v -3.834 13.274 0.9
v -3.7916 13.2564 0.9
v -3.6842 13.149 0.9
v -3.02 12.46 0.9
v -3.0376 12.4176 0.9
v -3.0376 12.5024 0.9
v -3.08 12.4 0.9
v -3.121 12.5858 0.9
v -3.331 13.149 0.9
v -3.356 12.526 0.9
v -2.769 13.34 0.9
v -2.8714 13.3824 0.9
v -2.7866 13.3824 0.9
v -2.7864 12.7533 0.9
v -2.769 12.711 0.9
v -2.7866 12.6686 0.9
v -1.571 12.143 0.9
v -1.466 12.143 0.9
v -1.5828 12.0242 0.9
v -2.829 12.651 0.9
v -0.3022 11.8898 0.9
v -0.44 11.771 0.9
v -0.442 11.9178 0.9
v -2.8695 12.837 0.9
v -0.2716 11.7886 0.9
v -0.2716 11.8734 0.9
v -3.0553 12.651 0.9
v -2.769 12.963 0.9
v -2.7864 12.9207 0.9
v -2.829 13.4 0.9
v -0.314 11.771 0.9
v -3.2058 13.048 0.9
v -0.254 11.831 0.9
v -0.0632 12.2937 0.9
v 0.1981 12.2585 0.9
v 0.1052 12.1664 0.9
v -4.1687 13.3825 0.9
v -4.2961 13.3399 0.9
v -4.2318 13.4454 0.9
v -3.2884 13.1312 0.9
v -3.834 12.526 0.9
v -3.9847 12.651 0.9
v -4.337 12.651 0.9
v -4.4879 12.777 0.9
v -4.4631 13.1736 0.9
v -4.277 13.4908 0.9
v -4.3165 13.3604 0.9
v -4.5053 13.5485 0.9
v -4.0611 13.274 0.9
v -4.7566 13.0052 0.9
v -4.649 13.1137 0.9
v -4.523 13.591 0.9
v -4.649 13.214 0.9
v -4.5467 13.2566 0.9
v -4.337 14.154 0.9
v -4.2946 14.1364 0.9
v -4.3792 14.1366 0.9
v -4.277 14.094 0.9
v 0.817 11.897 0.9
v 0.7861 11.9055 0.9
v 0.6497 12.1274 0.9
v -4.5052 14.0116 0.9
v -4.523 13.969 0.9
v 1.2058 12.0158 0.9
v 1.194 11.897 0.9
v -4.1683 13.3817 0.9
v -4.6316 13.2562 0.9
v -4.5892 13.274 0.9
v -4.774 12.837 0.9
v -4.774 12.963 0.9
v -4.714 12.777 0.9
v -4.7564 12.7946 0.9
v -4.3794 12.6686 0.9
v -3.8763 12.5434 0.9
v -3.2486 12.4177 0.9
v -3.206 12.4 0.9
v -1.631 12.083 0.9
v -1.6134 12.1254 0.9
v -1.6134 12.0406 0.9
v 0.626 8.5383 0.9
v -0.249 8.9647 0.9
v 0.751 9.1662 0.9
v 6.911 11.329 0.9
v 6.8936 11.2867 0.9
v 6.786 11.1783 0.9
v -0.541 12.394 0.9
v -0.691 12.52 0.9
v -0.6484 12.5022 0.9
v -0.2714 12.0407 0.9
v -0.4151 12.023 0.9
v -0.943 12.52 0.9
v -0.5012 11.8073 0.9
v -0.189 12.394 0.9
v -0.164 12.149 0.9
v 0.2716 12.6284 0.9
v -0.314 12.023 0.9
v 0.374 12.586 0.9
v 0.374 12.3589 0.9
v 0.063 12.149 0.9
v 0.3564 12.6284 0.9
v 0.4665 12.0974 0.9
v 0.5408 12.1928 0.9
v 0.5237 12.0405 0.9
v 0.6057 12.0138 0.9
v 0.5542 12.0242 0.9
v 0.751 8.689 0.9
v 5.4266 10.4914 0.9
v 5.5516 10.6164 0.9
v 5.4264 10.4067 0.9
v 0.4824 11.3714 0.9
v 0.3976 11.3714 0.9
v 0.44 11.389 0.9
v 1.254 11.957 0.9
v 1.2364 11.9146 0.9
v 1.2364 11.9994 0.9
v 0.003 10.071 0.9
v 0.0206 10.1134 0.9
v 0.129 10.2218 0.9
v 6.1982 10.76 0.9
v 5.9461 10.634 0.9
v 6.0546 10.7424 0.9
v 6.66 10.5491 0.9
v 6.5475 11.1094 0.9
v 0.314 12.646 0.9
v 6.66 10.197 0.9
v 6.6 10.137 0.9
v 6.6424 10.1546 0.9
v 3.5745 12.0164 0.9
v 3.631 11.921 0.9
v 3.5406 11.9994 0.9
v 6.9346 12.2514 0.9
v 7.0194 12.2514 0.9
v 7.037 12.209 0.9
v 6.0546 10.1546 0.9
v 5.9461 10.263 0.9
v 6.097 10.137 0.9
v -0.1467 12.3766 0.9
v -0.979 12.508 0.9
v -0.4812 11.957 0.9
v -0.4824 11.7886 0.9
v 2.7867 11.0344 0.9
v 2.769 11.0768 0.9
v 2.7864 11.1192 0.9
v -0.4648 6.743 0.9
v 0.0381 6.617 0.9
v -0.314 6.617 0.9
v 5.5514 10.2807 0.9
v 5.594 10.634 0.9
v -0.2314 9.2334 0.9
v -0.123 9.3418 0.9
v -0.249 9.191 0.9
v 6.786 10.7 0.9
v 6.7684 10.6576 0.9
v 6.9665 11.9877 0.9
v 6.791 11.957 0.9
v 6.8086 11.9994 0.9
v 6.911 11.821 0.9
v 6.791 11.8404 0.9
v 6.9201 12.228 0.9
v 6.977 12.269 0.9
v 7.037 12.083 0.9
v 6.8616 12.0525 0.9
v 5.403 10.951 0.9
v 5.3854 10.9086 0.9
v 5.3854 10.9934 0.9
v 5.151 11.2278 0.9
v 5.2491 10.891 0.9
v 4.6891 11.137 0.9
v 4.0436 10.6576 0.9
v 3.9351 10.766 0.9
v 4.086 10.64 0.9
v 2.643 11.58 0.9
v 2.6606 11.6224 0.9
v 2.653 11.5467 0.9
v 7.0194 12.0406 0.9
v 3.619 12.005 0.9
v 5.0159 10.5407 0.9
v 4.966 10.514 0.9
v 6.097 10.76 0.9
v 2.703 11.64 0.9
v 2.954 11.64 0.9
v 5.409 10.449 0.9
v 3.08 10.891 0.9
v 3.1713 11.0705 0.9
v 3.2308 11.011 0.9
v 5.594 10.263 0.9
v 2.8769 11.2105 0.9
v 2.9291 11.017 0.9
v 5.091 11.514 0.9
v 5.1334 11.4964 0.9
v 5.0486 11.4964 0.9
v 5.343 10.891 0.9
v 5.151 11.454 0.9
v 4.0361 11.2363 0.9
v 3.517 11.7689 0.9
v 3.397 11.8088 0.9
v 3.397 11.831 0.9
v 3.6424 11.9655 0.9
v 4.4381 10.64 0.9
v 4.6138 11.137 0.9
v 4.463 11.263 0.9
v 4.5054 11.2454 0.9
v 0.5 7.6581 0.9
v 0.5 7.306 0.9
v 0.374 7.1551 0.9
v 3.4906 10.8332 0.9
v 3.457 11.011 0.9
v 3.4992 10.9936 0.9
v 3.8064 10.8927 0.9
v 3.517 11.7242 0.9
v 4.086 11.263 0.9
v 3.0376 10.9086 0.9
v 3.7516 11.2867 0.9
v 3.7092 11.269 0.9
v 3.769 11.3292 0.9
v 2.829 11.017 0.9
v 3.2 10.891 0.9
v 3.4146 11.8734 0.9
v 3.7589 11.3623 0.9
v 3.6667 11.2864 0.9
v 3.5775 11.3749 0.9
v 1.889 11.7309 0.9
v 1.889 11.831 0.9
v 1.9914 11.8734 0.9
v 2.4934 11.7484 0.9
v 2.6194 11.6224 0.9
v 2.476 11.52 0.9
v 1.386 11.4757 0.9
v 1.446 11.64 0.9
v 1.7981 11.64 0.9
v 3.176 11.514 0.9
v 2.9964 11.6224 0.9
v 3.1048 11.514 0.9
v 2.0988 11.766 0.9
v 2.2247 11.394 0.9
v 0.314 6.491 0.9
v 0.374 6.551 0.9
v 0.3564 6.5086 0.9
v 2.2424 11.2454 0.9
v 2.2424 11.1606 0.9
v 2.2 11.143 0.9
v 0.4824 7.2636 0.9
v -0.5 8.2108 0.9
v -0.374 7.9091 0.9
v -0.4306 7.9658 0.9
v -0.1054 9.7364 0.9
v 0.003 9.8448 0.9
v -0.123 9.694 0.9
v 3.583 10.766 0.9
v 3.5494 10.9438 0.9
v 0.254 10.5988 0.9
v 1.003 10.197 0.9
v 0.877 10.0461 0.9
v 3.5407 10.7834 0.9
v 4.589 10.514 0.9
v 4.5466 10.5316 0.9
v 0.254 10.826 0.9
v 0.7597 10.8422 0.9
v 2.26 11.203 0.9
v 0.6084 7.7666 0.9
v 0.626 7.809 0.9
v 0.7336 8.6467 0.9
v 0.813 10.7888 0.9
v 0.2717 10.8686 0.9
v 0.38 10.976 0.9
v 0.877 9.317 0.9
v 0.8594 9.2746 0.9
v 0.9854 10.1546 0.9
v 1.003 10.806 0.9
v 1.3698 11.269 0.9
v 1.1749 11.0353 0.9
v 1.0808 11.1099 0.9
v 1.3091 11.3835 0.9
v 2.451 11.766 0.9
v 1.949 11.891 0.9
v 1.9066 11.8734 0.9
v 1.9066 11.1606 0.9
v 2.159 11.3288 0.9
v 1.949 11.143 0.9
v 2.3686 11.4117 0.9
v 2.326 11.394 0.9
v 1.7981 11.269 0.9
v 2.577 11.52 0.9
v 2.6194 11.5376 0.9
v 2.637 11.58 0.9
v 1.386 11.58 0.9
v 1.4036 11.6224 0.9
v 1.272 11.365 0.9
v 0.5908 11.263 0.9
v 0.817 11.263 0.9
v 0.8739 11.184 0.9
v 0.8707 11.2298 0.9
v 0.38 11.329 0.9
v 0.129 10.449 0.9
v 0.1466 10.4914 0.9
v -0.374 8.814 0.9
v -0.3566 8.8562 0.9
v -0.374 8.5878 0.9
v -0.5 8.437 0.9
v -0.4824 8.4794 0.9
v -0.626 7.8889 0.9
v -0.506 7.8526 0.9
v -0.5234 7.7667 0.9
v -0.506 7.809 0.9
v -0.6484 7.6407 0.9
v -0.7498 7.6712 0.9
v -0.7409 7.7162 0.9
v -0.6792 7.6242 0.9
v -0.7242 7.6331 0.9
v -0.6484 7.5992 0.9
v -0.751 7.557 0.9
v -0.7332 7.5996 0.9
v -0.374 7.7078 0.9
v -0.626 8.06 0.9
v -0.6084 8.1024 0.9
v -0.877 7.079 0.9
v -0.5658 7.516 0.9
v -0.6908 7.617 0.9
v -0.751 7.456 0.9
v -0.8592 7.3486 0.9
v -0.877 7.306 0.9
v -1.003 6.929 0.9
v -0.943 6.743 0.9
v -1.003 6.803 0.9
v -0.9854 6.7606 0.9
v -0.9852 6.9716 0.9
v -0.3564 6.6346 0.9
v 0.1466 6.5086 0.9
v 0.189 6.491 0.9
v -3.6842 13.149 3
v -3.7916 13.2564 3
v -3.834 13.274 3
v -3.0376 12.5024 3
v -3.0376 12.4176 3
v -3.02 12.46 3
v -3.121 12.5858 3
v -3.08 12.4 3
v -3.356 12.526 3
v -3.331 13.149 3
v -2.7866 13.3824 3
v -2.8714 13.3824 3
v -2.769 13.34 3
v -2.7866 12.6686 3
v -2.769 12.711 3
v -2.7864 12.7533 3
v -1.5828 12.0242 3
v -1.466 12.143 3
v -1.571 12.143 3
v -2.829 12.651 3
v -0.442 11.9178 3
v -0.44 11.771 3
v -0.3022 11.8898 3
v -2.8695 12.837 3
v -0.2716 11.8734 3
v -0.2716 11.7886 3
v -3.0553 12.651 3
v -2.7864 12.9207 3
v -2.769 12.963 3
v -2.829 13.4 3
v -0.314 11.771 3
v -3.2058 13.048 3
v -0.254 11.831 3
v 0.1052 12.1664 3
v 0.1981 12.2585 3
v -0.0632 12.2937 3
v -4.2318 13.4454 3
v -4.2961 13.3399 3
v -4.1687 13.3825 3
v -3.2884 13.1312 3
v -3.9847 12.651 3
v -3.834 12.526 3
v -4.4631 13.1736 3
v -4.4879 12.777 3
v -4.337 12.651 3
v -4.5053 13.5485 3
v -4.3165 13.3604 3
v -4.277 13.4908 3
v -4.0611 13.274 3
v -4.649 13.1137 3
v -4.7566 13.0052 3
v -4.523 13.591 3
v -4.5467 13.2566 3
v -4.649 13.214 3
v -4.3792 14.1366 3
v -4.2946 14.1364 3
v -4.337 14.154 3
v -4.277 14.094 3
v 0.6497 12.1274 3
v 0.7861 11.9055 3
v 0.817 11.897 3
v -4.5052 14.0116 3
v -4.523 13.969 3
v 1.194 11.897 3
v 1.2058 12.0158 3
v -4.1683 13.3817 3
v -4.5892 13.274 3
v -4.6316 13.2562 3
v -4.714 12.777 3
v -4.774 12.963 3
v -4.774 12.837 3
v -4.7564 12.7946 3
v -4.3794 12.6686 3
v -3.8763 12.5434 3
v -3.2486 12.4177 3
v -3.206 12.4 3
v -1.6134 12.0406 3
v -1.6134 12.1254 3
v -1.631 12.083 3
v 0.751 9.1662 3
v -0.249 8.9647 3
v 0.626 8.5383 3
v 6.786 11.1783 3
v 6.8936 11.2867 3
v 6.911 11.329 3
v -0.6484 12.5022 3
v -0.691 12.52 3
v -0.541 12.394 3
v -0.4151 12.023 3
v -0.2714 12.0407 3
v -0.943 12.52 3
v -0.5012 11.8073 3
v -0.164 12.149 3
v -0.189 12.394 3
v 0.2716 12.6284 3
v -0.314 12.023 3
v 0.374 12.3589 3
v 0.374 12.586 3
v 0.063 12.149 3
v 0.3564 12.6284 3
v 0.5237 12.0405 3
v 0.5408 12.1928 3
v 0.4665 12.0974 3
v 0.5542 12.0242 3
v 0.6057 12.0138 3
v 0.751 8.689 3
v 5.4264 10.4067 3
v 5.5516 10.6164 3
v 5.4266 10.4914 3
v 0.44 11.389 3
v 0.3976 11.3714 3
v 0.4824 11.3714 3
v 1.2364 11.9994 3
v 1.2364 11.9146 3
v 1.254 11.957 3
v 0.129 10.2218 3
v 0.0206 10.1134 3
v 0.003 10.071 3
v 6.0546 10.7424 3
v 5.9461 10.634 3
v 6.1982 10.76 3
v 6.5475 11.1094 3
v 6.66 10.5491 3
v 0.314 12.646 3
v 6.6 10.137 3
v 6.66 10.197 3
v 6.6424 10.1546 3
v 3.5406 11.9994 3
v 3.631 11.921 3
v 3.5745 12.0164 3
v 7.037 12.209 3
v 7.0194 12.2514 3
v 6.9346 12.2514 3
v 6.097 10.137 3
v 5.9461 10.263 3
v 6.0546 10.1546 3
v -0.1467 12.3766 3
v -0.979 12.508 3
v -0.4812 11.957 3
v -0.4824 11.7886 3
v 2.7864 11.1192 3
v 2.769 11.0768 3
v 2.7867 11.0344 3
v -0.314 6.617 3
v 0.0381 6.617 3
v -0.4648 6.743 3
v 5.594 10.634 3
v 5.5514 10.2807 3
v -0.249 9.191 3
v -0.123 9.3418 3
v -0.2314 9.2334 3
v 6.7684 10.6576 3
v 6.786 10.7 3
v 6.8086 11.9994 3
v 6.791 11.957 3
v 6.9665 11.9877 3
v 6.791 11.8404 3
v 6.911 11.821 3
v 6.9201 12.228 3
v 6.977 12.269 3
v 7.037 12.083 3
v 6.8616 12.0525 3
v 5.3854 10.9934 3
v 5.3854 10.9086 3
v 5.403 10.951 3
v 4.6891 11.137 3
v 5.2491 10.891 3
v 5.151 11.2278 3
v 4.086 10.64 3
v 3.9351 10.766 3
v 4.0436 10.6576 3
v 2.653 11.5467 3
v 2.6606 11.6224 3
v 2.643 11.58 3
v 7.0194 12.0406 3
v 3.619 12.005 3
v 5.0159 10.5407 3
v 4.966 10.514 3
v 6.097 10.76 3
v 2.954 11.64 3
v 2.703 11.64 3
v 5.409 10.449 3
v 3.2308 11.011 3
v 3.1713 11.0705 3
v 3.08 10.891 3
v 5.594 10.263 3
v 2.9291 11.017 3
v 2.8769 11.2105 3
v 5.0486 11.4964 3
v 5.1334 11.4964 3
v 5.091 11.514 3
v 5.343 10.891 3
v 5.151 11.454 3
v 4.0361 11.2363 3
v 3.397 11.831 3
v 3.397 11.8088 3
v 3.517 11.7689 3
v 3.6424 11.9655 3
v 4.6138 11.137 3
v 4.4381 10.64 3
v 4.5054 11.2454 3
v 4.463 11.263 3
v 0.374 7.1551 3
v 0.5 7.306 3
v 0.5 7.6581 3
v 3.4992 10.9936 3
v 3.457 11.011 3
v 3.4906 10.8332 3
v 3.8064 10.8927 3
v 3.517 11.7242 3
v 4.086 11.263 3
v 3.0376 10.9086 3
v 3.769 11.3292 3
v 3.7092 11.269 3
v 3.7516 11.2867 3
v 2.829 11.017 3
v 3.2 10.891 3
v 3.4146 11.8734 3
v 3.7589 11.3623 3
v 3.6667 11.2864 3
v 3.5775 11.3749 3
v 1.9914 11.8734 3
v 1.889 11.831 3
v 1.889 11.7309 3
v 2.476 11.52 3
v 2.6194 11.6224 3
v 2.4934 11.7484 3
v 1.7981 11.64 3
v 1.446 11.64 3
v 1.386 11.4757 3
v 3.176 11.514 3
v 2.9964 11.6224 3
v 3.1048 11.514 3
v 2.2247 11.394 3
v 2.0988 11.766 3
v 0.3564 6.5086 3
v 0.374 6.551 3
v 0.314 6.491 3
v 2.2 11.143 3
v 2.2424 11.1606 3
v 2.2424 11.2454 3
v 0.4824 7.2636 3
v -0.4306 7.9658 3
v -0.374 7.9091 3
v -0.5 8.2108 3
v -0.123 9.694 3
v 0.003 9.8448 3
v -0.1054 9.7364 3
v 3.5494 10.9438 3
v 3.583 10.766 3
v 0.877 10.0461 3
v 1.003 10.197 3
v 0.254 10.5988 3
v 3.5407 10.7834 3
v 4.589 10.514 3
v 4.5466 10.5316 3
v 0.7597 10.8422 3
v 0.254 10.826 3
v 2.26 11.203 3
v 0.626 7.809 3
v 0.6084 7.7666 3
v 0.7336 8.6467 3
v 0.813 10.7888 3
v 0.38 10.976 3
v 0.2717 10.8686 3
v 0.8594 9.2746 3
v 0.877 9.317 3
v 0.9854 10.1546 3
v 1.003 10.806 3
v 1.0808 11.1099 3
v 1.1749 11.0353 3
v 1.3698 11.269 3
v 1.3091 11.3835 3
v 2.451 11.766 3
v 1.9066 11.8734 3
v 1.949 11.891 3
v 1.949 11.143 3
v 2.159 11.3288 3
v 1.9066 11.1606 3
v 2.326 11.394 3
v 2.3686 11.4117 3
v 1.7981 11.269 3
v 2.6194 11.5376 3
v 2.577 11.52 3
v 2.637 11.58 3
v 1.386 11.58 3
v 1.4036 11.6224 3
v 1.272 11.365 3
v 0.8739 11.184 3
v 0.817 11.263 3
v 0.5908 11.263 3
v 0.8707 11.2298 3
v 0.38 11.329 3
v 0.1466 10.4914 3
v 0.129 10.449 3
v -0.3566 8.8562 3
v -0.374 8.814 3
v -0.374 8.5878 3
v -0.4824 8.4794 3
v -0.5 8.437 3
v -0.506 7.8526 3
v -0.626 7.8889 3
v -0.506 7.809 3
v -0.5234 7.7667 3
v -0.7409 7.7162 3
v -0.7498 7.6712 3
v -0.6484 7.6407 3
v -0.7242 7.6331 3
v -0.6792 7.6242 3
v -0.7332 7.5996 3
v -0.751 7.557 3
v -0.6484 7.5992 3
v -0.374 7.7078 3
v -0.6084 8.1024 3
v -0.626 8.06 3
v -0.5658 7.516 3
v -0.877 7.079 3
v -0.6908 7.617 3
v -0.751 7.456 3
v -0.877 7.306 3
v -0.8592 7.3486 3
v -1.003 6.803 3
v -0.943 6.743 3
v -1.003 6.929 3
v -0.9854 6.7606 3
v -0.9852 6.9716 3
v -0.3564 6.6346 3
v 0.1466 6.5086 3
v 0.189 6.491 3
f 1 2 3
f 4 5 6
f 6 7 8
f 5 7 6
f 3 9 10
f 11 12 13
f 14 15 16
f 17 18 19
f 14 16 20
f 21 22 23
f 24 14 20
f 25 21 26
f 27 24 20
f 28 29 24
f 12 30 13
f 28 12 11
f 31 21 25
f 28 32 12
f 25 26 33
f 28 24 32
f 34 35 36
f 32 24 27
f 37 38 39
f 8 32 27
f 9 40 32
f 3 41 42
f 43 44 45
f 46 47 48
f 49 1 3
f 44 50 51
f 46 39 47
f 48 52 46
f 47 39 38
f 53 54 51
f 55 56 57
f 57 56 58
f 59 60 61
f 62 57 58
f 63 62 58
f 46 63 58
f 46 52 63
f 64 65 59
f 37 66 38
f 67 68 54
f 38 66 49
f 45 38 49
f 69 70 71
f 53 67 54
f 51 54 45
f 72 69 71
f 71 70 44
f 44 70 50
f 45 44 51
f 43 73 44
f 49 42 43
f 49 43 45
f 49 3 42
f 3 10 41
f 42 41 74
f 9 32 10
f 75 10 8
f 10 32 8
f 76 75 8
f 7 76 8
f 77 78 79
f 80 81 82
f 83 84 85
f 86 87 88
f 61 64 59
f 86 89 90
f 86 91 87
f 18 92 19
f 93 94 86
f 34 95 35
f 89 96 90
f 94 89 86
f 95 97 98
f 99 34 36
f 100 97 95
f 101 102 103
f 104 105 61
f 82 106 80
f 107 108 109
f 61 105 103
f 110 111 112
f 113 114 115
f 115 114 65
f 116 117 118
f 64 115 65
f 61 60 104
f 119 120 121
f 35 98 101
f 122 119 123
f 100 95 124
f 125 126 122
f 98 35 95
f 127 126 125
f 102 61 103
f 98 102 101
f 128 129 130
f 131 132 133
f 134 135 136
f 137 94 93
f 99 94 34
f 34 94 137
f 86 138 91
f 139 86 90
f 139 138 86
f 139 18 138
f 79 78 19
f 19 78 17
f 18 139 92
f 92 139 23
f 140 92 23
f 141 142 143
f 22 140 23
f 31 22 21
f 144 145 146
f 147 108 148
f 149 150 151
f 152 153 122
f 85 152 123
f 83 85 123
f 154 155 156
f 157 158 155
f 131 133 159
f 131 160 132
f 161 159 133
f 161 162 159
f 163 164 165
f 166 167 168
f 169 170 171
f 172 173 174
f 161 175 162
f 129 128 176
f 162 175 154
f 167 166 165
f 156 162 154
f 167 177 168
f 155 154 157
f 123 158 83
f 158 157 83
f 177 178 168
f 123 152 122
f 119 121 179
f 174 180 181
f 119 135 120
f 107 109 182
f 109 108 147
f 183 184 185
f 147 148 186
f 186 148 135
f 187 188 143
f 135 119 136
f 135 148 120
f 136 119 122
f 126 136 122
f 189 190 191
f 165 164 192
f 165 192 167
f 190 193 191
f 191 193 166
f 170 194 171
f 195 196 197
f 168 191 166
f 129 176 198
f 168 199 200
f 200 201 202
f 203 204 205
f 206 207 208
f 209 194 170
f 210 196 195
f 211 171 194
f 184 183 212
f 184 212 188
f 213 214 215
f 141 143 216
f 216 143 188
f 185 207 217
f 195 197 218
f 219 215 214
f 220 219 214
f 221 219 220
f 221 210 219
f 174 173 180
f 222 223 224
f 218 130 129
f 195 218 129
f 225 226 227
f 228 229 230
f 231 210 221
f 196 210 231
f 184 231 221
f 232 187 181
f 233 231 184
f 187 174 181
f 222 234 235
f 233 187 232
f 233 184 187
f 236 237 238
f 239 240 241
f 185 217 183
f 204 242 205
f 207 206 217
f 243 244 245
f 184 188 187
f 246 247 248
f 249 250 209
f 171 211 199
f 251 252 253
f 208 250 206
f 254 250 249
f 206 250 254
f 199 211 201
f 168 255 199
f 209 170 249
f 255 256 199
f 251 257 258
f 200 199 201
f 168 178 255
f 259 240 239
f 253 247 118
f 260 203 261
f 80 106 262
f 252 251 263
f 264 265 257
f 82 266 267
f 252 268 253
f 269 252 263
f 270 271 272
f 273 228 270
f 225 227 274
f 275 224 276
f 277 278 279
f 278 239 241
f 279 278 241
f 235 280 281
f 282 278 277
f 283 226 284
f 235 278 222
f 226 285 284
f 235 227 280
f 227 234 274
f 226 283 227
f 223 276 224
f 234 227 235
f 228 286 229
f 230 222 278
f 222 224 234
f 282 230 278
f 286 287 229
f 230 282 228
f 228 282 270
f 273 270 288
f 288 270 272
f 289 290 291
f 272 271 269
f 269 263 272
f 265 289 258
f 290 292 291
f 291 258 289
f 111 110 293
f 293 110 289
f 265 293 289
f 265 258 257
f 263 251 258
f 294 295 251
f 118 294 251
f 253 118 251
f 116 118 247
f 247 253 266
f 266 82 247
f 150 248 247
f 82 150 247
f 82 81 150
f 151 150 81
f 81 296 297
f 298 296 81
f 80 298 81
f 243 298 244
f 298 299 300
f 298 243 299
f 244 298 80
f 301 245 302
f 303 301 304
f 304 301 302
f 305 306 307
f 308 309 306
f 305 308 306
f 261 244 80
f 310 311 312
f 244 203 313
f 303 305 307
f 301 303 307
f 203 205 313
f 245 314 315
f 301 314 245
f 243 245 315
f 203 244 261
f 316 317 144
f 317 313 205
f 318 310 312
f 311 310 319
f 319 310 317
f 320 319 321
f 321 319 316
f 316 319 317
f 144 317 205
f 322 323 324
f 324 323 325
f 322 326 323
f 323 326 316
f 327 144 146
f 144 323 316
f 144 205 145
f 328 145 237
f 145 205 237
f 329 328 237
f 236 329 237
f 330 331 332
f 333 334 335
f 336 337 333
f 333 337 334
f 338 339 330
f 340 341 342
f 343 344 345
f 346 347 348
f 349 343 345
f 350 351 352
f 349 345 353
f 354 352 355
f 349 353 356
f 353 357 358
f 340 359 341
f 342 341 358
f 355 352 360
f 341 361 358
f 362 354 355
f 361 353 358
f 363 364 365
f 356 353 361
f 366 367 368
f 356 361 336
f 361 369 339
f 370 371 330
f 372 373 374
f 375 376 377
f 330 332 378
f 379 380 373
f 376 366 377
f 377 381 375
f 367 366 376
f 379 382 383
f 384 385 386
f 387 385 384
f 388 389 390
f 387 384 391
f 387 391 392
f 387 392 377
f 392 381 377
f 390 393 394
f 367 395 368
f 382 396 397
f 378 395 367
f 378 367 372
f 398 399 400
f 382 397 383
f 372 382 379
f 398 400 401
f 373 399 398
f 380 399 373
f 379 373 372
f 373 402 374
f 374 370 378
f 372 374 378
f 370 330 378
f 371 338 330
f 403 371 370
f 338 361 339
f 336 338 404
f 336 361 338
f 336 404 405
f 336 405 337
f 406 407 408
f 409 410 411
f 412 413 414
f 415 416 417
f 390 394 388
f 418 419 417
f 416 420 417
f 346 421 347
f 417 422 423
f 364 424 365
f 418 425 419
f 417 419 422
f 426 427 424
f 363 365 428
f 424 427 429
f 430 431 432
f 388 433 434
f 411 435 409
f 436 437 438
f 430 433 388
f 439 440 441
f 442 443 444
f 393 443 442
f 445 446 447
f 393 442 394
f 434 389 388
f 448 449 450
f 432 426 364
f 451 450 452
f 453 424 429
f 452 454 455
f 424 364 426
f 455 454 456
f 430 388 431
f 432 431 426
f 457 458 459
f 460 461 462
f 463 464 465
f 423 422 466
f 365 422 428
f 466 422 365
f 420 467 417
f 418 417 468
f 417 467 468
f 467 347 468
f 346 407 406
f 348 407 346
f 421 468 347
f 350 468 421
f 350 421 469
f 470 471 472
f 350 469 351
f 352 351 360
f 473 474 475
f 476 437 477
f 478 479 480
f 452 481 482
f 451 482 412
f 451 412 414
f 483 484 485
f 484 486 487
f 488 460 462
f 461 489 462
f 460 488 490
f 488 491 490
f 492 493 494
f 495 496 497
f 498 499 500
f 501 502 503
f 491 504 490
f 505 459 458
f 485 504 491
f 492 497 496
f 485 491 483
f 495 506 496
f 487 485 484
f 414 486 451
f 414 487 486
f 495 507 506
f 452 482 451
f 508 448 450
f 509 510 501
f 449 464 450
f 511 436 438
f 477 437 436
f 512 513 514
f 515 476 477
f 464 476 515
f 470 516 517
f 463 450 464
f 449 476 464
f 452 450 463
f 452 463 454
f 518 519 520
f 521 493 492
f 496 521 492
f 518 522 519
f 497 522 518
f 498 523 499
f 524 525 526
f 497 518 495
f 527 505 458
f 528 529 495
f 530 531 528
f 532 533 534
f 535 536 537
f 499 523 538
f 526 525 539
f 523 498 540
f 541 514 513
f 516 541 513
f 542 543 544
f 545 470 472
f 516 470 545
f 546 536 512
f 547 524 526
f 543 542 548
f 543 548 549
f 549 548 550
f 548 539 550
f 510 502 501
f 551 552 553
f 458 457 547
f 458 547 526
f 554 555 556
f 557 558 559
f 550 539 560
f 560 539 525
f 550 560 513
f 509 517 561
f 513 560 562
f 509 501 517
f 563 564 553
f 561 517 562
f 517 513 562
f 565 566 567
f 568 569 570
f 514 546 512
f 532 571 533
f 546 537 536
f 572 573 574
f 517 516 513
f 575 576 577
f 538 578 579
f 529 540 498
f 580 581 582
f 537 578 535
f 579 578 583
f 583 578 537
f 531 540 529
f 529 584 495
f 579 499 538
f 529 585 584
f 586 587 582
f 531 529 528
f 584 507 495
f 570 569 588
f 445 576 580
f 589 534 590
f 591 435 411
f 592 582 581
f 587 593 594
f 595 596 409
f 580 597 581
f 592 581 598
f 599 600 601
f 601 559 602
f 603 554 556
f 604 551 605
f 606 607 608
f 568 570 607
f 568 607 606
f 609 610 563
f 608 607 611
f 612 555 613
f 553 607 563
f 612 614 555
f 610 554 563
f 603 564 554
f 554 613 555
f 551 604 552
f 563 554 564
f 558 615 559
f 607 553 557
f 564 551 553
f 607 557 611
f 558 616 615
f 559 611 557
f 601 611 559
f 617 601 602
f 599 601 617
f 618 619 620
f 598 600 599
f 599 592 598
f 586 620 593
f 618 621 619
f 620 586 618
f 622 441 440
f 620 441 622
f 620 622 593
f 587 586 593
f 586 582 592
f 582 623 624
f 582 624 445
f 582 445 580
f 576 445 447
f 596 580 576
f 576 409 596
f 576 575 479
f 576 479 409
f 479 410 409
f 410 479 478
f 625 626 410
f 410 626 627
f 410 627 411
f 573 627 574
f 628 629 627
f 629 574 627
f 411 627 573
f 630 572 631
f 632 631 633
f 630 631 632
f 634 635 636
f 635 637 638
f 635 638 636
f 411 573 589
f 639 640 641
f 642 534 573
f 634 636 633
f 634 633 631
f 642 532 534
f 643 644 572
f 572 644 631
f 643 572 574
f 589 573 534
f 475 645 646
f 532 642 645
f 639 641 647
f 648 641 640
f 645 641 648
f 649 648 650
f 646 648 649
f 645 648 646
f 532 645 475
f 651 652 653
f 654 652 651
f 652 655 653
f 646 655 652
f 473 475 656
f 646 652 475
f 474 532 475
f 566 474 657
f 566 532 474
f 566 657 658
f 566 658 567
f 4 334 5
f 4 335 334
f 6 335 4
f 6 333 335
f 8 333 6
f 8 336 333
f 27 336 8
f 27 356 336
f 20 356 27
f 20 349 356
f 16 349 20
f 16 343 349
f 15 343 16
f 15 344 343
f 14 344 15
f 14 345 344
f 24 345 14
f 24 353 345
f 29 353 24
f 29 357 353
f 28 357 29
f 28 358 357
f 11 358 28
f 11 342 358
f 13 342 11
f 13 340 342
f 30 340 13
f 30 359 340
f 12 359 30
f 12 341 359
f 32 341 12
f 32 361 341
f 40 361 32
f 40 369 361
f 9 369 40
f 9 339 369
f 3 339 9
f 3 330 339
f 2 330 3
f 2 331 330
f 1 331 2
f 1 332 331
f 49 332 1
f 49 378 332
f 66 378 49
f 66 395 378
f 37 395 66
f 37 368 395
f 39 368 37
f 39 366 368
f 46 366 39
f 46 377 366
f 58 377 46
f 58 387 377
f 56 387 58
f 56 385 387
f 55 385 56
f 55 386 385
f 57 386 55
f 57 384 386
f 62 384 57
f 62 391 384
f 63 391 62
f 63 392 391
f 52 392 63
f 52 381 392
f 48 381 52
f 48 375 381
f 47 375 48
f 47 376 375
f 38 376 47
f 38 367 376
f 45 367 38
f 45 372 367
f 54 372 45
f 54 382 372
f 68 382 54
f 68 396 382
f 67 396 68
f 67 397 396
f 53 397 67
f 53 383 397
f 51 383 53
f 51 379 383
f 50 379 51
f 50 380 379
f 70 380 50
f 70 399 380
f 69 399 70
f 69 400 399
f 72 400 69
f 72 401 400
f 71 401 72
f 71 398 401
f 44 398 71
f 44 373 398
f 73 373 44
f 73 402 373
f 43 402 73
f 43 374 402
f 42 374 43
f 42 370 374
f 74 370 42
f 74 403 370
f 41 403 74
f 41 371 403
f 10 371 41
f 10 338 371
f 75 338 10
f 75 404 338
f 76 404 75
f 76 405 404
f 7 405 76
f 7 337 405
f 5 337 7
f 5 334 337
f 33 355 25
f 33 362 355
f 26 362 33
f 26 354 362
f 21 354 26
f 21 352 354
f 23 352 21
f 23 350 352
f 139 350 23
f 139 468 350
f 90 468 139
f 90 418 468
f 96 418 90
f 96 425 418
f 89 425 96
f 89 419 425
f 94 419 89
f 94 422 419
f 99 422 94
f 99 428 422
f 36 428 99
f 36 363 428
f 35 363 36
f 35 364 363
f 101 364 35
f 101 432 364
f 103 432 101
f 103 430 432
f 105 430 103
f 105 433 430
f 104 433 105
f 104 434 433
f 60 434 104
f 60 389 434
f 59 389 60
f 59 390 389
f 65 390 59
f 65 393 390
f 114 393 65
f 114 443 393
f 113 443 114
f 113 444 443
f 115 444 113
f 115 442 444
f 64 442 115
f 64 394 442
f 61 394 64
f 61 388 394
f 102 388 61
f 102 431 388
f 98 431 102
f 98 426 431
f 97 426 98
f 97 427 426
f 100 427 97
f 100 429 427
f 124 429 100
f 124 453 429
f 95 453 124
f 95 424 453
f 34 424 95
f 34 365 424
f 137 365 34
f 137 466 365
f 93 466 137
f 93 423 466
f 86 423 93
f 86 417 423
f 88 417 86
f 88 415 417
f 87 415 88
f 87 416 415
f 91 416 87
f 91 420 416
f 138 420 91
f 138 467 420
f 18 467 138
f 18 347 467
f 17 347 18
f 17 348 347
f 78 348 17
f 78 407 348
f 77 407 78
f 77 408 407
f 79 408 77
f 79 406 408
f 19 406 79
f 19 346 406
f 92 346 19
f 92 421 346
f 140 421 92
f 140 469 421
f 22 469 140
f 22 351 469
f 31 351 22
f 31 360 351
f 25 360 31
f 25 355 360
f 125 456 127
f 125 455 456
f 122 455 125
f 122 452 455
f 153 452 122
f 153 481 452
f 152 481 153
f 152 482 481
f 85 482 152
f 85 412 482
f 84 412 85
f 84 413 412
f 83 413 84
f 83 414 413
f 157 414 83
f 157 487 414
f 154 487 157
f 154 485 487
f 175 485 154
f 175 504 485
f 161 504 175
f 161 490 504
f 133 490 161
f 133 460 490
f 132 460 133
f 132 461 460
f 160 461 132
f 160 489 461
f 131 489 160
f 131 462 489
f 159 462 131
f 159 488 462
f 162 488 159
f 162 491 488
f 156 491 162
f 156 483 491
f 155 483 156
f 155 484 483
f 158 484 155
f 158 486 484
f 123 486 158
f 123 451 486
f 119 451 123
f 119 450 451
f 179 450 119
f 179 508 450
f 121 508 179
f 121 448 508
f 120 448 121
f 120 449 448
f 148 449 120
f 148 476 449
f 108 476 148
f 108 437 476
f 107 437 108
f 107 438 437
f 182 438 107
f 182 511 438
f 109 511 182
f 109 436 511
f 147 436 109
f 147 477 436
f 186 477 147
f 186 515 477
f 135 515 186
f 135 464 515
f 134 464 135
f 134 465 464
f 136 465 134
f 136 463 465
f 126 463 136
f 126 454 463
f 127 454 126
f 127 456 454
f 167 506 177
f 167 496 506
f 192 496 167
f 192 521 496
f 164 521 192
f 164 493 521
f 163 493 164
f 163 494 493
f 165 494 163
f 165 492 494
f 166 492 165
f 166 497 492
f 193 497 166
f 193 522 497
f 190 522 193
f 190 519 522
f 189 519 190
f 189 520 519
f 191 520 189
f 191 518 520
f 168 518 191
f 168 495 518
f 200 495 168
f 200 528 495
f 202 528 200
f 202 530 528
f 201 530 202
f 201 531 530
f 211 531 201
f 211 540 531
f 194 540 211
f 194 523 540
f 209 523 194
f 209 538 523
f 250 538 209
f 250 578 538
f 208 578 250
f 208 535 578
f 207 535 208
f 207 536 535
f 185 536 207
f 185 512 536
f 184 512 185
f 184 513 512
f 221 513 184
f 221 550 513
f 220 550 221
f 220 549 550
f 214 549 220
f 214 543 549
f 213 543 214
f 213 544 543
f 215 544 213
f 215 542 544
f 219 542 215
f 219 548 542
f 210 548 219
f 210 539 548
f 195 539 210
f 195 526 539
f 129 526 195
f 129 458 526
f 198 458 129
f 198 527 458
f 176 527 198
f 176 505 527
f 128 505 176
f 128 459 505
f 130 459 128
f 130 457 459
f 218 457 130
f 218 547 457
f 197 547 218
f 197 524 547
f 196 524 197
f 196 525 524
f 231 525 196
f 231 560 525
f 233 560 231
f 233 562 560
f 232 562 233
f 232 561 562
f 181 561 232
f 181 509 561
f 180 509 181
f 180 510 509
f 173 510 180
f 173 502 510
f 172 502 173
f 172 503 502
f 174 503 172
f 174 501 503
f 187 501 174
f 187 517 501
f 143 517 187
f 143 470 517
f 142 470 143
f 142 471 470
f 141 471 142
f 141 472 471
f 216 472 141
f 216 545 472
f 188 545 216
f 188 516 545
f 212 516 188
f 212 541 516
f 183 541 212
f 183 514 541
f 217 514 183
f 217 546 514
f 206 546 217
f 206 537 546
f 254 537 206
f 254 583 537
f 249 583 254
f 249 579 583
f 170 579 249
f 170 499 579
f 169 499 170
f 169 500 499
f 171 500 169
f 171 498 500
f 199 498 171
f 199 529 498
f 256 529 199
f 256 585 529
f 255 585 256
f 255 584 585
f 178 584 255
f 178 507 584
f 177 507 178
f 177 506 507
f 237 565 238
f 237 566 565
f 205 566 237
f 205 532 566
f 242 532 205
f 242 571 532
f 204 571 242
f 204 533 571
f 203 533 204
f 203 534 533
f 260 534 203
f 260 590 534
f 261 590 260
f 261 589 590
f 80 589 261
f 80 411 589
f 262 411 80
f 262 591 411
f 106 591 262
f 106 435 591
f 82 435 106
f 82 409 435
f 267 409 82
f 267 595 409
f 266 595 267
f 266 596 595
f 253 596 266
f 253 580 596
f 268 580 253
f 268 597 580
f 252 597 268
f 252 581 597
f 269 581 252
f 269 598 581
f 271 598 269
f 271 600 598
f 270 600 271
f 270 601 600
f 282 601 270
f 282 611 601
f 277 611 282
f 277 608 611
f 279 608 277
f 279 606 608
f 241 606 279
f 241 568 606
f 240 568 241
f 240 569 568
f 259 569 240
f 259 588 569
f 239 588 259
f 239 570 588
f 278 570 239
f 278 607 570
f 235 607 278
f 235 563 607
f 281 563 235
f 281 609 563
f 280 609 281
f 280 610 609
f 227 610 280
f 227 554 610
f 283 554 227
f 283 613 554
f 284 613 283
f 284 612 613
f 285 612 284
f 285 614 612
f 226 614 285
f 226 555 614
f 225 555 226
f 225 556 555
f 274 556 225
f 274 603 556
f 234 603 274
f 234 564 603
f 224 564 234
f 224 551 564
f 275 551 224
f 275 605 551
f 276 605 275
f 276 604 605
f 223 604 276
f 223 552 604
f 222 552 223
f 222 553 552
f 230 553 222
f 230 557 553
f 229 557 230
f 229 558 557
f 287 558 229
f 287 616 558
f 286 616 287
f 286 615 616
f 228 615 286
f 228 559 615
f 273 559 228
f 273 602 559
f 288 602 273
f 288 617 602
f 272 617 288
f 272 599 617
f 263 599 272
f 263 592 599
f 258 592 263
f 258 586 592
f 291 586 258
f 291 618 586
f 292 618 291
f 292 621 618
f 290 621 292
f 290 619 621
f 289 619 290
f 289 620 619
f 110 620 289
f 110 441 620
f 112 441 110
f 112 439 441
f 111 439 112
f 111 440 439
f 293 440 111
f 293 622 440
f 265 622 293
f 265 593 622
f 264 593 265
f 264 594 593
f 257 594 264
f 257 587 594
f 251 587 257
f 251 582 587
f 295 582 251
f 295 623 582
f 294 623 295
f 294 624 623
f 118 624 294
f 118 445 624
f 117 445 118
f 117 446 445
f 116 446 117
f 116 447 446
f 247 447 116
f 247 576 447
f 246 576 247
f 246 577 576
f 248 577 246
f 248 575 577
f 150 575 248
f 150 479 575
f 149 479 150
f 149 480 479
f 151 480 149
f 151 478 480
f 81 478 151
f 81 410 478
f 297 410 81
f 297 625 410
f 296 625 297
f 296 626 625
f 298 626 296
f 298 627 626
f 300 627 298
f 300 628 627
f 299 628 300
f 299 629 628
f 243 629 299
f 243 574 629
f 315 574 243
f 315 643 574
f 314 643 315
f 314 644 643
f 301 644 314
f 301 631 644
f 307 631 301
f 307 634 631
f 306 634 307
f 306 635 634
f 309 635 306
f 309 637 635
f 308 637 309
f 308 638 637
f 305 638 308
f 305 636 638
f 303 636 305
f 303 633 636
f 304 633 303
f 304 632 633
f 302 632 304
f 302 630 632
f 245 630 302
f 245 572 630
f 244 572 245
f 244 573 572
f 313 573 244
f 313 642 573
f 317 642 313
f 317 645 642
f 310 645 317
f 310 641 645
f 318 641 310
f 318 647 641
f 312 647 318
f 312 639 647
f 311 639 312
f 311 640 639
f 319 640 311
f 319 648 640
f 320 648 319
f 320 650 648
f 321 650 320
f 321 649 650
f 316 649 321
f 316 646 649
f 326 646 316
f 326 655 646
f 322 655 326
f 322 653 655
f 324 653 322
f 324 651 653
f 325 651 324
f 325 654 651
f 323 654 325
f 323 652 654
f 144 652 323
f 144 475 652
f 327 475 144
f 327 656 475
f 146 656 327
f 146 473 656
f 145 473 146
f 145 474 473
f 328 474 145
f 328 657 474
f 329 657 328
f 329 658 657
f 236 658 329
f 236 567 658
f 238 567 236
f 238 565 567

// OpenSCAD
$fn = 24;
translate([0, -2.500, 0.900])
  linear_extrude(height=2.100) {
offset(r=0.06, $fn=8) {
    polygon(points=[[6.977,14.709],[6.600,13.577],[6.223,13.200],[6.097,13.200],[5.971,13.326],[5.720,13.326],[5.971,13.326],[6.097,13.200],[5.971,13.074],[5.594,13.074],[5.469,12.949],[5.217,12.949],[5.469,12.949],[5.594,12.823],[5.971,12.823],[6.097,12.697],[6.600,12.697],[6.600,13.074],[6.726,13.200],[6.726,13.703],[6.851,13.829],[6.851,14.457],[6.977,14.583]], paths=[[0,1,2,3,4,5,6,7,8,9,10,11,12,13,14,15,16,17,18,19,20,21,22]]);
    polygon(points=[[5.091,14.080],[5.091,13.954],[4.714,13.577],[4.589,13.577],[4.463,13.703],[4.086,13.703],[3.834,13.326],[3.206,13.451],[3.080,13.577],[3.583,13.954],[3.709,13.829],[3.834,13.829],[3.709,13.829],[3.457,14.206],[3.457,14.331],[3.583,14.457],[3.583,14.709],[3.583,14.457],[3.206,13.954],[3.080,13.954],[2.954,14.080],[2.577,14.080],[2.451,14.206],[2.074,14.206],[1.949,14.331],[1.949,14.206],[1.823,14.080],[1.446,14.080],[1.446,13.954],[0.817,13.200],[0.691,13.326],[0.817,13.703],[0.566,13.703],[0.440,13.829],[0.440,13.954],[0.440,13.451],[0.314,13.326],[0.314,13.074],[0.189,12.949],[0.189,12.697],[0.063,12.571],[0.063,12.320],[-0.063,12.194],[-0.063,11.817],[-0.189,11.691],[-0.189,11.440],[-0.314,11.314],[-0.314,11.063],[-0.440,10.937],[-0.440,10.686],[-0.566,10.560],[-0.566,10.309],[-0.691,10.183],[-0.691,9.931],[-0.817,9.806],[-0.817,9.554],[-0.943,9.429],[-0.943,9.303],[-0.440,9.303],[-0.314,9.177],[0.063,9.177],[0.189,9.051],[0.314,9.051],[0.314,9.680],[0.440,9.806],[0.440,10.183],[0.566,10.309],[0.566,11.063],[0.691,11.189],[0.691,11.691],[0.817,11.817],[0.817,12.571],[0.943,12.697],[0.943,13.326],[1.320,13.829],[1.823,13.829],[1.949,13.703],[2.200,13.703],[2.074,13.829],[2.200,13.954],[2.326,13.954],[2.451,14.080],[2.703,14.080],[2.954,13.703],[2.829,13.577],[2.577,13.577],[2.954,13.577],[3.080,13.451],[3.457,13.451],[3.583,13.326],[3.960,13.326],[4.086,13.200],[4.463,13.200],[4.589,13.074],[4.966,13.074],[5.217,13.451],[5.469,13.451],[5.343,13.451],[5.091,13.703],[-0.440,10.560],[-0.314,10.434],[-0.314,10.183],[-0.566,9.931],[-0.691,10.057],[-0.691,10.183]], paths=[[0,1,2,3,4,5,6,7,8,9,10,11,12,13,14,15,16,17,18,19,20,21,22,23,24,25,26,27,28,29,30,31,32,33,34,35,36,37,38,39,40,41,42,43,44,45,46,47,48,49,50,51,52,53,54,55,56,57,58,59,60,61,62,63,64,65,66,67,68,69,70,71,72,73,74,75,76,77,78,79,80,81,82,83,84,85,86,87,88,89,90,91,92,93,94,95,96,97,98],[99,100,101,102,103,104]]);
    polygon(points=[[1.194,14.457],[0.566,14.583],[0.314,14.834],[0.314,15.211],[0.440,15.337],[0.440,15.589],[0.440,15.337],[0.314,15.211],[0.314,15.086],[-0.063,14.709],[-0.189,14.834],[-0.566,14.834],[-0.691,14.960],[-0.943,14.960],[-1.446,14.583],[-1.571,14.583],[-0.314,14.331],[-0.440,14.331],[-0.566,14.457],[-0.440,14.583],[-0.314,14.583],[-0.189,14.709],[0.063,14.709],[0.189,14.834],[0.817,14.457]], paths=[[0,1,2,3,4,5,6,7,8,9,10,11,12,13,14,15,16,17,18,19,20,21,22,23,24]]);
    polygon(points=[[-4.211,17.349],[-4.211,16.971],[-4.337,16.846],[-4.337,16.594],[-4.463,16.469],[-4.463,16.091],[-4.211,15.840],[-4.463,15.589],[-4.589,15.714],[-4.589,15.840],[-4.589,15.589],[-4.714,15.463],[-4.714,15.337],[-4.463,15.337],[-4.337,15.211],[-3.960,15.211],[-3.834,15.086],[-3.331,15.086],[-3.206,14.960],[-2.829,14.960],[-3.080,14.960],[-3.206,15.086],[-3.080,15.211],[-2.829,15.211],[-2.954,15.337],[-2.829,15.463],[-2.829,16.091],[-2.829,15.840],[-3.206,15.463],[-3.331,15.589],[-3.709,15.589],[-3.834,15.714],[-4.086,15.714],[-4.337,15.966],[-4.337,16.846],[-4.211,16.971]], paths=[[0,1,2,3,4,5,6,7,8,9,10,11,12,13,14,15,16,17,18,19,20,21,22,23,24,25,26,27,28,29,30,31,32,33,34,35]]);
}
}
